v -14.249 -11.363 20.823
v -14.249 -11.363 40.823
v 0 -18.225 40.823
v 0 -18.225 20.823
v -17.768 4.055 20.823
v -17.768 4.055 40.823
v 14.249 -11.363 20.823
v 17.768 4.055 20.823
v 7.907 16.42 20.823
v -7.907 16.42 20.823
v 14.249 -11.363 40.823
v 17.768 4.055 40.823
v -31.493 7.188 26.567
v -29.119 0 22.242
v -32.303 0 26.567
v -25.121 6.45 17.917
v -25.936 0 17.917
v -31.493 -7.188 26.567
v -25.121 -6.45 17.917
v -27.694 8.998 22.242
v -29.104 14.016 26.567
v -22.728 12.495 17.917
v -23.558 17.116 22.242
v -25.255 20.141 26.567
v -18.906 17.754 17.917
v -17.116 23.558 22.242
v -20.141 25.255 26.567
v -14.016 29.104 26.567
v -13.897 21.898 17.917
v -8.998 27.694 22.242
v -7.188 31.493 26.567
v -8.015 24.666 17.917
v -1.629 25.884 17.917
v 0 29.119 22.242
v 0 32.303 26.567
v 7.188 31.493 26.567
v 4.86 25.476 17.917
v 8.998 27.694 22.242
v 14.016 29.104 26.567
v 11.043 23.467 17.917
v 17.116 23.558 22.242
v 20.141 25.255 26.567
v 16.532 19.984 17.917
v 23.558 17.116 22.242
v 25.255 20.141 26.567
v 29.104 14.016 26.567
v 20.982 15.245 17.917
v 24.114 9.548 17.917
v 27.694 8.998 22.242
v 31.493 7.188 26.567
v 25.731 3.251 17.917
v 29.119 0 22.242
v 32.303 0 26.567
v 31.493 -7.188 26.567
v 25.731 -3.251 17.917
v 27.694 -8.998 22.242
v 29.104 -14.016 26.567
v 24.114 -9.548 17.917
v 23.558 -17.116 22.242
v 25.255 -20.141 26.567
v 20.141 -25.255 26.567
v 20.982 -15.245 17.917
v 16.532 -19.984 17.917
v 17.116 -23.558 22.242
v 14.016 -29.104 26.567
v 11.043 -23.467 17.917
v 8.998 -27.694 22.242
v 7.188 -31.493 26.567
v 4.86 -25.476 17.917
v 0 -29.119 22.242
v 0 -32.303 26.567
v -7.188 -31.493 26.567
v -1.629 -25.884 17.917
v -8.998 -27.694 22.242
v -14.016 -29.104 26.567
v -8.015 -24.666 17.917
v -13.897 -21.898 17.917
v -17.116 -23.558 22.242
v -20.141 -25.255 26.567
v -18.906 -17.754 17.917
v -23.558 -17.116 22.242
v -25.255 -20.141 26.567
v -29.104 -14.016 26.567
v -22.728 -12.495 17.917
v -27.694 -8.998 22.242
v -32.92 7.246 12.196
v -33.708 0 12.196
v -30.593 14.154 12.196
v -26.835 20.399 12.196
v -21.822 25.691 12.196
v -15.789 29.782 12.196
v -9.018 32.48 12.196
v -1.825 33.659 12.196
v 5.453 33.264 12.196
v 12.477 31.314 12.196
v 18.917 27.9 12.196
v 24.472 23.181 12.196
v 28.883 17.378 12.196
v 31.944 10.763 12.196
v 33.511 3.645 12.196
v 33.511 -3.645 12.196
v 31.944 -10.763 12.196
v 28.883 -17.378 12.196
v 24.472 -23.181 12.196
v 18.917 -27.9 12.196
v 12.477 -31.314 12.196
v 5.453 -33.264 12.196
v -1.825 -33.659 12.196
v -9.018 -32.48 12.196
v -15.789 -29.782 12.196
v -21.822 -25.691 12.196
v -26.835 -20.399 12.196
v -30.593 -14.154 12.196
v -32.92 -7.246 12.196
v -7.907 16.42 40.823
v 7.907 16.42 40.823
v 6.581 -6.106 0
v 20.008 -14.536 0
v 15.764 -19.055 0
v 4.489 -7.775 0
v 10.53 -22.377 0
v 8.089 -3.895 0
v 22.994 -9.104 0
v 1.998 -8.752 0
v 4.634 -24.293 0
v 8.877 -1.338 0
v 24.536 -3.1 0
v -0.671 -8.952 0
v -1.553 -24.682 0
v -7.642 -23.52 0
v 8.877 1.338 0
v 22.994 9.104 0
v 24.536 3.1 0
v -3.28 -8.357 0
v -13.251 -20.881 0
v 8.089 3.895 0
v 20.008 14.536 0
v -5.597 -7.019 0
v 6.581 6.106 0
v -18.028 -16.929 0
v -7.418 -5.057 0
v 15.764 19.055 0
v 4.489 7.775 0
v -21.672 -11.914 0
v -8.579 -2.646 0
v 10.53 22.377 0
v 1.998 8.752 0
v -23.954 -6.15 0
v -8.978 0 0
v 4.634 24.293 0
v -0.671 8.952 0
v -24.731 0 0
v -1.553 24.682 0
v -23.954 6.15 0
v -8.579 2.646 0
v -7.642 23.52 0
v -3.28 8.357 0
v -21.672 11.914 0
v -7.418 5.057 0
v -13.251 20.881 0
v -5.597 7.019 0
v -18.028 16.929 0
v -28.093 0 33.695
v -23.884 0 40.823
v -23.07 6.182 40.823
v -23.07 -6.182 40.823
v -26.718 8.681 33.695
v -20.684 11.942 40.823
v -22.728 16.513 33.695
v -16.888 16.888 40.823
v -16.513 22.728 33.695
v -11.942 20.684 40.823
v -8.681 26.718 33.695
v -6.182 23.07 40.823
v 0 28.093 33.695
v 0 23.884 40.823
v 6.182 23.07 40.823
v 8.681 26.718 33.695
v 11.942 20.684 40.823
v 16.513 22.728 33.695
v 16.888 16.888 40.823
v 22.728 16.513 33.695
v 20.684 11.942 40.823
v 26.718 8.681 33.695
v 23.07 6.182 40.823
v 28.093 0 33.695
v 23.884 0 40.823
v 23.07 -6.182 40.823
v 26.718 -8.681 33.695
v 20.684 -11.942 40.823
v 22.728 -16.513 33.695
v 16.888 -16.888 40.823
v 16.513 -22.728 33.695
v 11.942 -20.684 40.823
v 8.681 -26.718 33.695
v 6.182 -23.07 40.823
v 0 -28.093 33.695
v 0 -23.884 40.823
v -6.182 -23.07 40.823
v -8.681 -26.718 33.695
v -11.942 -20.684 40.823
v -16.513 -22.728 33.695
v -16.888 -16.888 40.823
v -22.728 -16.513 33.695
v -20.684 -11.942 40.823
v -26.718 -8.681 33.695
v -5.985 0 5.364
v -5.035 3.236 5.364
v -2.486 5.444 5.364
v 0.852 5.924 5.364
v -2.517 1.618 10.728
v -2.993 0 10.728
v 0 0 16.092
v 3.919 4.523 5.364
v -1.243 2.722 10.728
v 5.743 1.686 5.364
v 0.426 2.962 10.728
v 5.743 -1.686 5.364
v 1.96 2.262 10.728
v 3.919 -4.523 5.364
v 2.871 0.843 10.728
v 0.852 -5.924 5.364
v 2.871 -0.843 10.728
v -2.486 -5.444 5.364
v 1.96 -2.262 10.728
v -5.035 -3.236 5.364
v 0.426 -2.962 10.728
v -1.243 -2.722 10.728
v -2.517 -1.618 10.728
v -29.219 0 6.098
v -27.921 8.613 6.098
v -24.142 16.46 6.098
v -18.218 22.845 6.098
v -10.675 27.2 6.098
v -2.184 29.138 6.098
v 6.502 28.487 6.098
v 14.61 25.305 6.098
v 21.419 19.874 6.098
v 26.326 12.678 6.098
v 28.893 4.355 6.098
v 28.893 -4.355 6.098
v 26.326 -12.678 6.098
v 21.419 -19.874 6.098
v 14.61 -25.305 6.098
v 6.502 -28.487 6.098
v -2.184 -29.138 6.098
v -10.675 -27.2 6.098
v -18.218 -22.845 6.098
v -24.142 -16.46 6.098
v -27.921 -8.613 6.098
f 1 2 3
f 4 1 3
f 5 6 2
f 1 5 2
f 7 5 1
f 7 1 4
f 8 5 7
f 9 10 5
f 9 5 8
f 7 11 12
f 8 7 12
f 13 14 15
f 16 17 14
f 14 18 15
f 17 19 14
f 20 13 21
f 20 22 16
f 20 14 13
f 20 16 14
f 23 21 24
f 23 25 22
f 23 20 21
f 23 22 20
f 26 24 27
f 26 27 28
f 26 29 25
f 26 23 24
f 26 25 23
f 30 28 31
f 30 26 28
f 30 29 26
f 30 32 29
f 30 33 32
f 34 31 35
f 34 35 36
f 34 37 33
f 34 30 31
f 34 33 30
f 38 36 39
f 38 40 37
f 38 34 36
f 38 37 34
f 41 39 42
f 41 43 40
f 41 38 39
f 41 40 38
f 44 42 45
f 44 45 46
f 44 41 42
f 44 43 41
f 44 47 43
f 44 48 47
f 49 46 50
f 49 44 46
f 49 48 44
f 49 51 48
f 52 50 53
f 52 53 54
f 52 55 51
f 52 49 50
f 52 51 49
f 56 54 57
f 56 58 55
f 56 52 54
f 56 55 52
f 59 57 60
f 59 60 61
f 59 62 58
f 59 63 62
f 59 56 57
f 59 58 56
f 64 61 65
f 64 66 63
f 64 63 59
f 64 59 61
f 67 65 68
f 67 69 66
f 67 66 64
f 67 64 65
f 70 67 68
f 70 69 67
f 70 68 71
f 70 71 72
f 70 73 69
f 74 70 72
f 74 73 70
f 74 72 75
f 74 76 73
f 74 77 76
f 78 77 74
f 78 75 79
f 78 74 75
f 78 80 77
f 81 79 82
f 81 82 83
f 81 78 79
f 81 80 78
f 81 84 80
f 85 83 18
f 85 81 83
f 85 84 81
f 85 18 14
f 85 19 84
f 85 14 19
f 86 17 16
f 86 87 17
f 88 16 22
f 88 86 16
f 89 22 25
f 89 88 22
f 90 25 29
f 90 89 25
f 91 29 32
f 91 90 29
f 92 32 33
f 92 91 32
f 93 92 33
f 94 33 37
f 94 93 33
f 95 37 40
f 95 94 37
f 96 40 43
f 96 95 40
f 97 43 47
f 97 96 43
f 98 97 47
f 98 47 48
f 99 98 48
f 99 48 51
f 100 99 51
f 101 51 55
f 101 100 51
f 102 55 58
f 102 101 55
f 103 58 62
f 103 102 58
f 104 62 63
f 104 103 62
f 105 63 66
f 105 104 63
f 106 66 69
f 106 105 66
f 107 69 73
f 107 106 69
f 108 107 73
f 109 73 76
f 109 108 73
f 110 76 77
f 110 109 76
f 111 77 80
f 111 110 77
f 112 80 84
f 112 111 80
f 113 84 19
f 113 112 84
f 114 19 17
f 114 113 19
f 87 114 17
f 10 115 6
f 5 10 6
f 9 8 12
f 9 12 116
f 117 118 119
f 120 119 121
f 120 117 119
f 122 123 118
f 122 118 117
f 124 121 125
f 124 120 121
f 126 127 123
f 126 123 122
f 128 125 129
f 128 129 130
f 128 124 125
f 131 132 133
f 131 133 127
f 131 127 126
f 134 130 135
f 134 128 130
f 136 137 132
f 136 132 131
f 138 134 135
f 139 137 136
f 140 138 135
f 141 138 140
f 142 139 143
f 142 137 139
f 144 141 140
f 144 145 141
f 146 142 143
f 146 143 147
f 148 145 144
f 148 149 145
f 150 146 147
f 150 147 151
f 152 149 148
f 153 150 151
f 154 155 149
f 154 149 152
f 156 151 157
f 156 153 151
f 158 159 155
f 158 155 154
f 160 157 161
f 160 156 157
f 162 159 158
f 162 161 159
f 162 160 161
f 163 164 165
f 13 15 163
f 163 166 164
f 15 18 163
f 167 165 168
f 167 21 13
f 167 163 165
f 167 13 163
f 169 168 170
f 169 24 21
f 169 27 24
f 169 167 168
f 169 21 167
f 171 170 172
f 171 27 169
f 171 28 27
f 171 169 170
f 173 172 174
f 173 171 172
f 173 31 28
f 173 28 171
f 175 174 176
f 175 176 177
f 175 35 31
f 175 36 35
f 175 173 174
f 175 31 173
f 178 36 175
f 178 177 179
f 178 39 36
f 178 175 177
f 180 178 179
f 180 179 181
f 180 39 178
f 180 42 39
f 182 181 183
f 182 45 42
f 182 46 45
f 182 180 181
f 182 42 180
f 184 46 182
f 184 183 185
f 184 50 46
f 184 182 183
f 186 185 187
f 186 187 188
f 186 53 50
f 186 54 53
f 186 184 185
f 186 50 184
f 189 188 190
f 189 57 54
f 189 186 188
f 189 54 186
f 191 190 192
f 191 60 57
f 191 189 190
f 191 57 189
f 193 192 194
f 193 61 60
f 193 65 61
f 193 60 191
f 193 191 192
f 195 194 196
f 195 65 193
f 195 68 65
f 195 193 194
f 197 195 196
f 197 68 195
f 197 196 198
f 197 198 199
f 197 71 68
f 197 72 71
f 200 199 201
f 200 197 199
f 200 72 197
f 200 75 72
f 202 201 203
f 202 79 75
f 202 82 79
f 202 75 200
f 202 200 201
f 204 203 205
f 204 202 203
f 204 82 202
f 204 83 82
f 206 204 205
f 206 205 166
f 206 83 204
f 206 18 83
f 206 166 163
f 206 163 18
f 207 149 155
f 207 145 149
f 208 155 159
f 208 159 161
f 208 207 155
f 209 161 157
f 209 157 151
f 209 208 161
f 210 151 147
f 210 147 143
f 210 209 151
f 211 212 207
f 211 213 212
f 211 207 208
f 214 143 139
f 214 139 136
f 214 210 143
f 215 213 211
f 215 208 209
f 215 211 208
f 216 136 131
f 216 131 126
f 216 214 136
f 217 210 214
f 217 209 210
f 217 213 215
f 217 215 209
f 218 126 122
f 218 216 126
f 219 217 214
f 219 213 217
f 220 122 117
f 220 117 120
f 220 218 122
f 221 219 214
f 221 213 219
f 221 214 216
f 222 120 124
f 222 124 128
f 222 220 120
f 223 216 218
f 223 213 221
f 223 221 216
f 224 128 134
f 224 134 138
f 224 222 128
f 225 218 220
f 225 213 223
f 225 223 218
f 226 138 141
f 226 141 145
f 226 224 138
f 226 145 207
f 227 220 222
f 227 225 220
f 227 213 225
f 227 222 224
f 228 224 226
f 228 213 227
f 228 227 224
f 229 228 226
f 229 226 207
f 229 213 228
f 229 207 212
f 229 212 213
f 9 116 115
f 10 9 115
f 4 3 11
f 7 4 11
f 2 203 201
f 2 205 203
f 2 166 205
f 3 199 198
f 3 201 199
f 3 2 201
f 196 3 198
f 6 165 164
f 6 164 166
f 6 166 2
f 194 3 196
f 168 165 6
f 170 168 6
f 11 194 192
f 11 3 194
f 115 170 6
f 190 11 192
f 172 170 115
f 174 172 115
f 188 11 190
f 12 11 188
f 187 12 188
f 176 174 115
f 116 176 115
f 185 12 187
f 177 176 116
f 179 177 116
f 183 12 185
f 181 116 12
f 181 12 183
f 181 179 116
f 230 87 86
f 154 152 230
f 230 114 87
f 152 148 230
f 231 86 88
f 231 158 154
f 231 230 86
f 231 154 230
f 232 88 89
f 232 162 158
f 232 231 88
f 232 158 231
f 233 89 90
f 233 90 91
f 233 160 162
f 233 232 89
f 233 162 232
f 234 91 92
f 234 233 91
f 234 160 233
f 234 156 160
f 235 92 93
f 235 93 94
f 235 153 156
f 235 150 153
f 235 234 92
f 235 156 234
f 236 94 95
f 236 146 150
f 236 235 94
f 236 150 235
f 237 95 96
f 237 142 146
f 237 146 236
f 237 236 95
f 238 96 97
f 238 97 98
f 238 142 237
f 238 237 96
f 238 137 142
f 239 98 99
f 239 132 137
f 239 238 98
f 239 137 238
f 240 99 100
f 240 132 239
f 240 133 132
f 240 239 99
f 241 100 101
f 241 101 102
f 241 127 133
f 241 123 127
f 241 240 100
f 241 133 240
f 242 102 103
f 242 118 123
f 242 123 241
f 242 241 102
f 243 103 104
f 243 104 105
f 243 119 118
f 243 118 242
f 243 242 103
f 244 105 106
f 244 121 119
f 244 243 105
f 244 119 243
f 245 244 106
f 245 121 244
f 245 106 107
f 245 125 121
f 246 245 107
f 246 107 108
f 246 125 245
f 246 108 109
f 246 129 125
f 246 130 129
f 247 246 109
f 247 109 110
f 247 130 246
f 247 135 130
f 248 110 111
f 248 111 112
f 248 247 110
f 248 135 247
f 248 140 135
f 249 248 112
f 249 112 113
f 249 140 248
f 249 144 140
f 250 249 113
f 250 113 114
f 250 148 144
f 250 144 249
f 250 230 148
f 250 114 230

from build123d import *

# Parameters (mm, degrees)
F3_DEPTH = 20


with BuildPart() as f1:
    # F0 (on Front) → F1 (revolve)
    with BuildSketch(Plane.XZ):
        Polygon((-8.977577, 0), (0, 16.091861), (0, 40.822521), (-23.88373, 40.822521), (-32.302976, 26.567327), (-25.935675, 17.91742), (-33.708245, 12.195937), (-24.730667, 0), align=None)
    revolve(axis=Axis((0, 0, 28.457191), (0, 0, -1)))

    # F2 (on face) → F3 (cut)
    with BuildSketch(Plane.XY.offset(40.822521)):
        Polygon((7.907405, 16.419895), (-7.907405, 16.419895), (-17.767777, 4.055379), (-14.248651, -11.36292), (0, -18.224709), (14.248651, -11.36292), (17.767777, 4.055379), align=None)
    extrude(amount=-F3_DEPTH, mode=Mode.SUBTRACT)


solid = f1.part
